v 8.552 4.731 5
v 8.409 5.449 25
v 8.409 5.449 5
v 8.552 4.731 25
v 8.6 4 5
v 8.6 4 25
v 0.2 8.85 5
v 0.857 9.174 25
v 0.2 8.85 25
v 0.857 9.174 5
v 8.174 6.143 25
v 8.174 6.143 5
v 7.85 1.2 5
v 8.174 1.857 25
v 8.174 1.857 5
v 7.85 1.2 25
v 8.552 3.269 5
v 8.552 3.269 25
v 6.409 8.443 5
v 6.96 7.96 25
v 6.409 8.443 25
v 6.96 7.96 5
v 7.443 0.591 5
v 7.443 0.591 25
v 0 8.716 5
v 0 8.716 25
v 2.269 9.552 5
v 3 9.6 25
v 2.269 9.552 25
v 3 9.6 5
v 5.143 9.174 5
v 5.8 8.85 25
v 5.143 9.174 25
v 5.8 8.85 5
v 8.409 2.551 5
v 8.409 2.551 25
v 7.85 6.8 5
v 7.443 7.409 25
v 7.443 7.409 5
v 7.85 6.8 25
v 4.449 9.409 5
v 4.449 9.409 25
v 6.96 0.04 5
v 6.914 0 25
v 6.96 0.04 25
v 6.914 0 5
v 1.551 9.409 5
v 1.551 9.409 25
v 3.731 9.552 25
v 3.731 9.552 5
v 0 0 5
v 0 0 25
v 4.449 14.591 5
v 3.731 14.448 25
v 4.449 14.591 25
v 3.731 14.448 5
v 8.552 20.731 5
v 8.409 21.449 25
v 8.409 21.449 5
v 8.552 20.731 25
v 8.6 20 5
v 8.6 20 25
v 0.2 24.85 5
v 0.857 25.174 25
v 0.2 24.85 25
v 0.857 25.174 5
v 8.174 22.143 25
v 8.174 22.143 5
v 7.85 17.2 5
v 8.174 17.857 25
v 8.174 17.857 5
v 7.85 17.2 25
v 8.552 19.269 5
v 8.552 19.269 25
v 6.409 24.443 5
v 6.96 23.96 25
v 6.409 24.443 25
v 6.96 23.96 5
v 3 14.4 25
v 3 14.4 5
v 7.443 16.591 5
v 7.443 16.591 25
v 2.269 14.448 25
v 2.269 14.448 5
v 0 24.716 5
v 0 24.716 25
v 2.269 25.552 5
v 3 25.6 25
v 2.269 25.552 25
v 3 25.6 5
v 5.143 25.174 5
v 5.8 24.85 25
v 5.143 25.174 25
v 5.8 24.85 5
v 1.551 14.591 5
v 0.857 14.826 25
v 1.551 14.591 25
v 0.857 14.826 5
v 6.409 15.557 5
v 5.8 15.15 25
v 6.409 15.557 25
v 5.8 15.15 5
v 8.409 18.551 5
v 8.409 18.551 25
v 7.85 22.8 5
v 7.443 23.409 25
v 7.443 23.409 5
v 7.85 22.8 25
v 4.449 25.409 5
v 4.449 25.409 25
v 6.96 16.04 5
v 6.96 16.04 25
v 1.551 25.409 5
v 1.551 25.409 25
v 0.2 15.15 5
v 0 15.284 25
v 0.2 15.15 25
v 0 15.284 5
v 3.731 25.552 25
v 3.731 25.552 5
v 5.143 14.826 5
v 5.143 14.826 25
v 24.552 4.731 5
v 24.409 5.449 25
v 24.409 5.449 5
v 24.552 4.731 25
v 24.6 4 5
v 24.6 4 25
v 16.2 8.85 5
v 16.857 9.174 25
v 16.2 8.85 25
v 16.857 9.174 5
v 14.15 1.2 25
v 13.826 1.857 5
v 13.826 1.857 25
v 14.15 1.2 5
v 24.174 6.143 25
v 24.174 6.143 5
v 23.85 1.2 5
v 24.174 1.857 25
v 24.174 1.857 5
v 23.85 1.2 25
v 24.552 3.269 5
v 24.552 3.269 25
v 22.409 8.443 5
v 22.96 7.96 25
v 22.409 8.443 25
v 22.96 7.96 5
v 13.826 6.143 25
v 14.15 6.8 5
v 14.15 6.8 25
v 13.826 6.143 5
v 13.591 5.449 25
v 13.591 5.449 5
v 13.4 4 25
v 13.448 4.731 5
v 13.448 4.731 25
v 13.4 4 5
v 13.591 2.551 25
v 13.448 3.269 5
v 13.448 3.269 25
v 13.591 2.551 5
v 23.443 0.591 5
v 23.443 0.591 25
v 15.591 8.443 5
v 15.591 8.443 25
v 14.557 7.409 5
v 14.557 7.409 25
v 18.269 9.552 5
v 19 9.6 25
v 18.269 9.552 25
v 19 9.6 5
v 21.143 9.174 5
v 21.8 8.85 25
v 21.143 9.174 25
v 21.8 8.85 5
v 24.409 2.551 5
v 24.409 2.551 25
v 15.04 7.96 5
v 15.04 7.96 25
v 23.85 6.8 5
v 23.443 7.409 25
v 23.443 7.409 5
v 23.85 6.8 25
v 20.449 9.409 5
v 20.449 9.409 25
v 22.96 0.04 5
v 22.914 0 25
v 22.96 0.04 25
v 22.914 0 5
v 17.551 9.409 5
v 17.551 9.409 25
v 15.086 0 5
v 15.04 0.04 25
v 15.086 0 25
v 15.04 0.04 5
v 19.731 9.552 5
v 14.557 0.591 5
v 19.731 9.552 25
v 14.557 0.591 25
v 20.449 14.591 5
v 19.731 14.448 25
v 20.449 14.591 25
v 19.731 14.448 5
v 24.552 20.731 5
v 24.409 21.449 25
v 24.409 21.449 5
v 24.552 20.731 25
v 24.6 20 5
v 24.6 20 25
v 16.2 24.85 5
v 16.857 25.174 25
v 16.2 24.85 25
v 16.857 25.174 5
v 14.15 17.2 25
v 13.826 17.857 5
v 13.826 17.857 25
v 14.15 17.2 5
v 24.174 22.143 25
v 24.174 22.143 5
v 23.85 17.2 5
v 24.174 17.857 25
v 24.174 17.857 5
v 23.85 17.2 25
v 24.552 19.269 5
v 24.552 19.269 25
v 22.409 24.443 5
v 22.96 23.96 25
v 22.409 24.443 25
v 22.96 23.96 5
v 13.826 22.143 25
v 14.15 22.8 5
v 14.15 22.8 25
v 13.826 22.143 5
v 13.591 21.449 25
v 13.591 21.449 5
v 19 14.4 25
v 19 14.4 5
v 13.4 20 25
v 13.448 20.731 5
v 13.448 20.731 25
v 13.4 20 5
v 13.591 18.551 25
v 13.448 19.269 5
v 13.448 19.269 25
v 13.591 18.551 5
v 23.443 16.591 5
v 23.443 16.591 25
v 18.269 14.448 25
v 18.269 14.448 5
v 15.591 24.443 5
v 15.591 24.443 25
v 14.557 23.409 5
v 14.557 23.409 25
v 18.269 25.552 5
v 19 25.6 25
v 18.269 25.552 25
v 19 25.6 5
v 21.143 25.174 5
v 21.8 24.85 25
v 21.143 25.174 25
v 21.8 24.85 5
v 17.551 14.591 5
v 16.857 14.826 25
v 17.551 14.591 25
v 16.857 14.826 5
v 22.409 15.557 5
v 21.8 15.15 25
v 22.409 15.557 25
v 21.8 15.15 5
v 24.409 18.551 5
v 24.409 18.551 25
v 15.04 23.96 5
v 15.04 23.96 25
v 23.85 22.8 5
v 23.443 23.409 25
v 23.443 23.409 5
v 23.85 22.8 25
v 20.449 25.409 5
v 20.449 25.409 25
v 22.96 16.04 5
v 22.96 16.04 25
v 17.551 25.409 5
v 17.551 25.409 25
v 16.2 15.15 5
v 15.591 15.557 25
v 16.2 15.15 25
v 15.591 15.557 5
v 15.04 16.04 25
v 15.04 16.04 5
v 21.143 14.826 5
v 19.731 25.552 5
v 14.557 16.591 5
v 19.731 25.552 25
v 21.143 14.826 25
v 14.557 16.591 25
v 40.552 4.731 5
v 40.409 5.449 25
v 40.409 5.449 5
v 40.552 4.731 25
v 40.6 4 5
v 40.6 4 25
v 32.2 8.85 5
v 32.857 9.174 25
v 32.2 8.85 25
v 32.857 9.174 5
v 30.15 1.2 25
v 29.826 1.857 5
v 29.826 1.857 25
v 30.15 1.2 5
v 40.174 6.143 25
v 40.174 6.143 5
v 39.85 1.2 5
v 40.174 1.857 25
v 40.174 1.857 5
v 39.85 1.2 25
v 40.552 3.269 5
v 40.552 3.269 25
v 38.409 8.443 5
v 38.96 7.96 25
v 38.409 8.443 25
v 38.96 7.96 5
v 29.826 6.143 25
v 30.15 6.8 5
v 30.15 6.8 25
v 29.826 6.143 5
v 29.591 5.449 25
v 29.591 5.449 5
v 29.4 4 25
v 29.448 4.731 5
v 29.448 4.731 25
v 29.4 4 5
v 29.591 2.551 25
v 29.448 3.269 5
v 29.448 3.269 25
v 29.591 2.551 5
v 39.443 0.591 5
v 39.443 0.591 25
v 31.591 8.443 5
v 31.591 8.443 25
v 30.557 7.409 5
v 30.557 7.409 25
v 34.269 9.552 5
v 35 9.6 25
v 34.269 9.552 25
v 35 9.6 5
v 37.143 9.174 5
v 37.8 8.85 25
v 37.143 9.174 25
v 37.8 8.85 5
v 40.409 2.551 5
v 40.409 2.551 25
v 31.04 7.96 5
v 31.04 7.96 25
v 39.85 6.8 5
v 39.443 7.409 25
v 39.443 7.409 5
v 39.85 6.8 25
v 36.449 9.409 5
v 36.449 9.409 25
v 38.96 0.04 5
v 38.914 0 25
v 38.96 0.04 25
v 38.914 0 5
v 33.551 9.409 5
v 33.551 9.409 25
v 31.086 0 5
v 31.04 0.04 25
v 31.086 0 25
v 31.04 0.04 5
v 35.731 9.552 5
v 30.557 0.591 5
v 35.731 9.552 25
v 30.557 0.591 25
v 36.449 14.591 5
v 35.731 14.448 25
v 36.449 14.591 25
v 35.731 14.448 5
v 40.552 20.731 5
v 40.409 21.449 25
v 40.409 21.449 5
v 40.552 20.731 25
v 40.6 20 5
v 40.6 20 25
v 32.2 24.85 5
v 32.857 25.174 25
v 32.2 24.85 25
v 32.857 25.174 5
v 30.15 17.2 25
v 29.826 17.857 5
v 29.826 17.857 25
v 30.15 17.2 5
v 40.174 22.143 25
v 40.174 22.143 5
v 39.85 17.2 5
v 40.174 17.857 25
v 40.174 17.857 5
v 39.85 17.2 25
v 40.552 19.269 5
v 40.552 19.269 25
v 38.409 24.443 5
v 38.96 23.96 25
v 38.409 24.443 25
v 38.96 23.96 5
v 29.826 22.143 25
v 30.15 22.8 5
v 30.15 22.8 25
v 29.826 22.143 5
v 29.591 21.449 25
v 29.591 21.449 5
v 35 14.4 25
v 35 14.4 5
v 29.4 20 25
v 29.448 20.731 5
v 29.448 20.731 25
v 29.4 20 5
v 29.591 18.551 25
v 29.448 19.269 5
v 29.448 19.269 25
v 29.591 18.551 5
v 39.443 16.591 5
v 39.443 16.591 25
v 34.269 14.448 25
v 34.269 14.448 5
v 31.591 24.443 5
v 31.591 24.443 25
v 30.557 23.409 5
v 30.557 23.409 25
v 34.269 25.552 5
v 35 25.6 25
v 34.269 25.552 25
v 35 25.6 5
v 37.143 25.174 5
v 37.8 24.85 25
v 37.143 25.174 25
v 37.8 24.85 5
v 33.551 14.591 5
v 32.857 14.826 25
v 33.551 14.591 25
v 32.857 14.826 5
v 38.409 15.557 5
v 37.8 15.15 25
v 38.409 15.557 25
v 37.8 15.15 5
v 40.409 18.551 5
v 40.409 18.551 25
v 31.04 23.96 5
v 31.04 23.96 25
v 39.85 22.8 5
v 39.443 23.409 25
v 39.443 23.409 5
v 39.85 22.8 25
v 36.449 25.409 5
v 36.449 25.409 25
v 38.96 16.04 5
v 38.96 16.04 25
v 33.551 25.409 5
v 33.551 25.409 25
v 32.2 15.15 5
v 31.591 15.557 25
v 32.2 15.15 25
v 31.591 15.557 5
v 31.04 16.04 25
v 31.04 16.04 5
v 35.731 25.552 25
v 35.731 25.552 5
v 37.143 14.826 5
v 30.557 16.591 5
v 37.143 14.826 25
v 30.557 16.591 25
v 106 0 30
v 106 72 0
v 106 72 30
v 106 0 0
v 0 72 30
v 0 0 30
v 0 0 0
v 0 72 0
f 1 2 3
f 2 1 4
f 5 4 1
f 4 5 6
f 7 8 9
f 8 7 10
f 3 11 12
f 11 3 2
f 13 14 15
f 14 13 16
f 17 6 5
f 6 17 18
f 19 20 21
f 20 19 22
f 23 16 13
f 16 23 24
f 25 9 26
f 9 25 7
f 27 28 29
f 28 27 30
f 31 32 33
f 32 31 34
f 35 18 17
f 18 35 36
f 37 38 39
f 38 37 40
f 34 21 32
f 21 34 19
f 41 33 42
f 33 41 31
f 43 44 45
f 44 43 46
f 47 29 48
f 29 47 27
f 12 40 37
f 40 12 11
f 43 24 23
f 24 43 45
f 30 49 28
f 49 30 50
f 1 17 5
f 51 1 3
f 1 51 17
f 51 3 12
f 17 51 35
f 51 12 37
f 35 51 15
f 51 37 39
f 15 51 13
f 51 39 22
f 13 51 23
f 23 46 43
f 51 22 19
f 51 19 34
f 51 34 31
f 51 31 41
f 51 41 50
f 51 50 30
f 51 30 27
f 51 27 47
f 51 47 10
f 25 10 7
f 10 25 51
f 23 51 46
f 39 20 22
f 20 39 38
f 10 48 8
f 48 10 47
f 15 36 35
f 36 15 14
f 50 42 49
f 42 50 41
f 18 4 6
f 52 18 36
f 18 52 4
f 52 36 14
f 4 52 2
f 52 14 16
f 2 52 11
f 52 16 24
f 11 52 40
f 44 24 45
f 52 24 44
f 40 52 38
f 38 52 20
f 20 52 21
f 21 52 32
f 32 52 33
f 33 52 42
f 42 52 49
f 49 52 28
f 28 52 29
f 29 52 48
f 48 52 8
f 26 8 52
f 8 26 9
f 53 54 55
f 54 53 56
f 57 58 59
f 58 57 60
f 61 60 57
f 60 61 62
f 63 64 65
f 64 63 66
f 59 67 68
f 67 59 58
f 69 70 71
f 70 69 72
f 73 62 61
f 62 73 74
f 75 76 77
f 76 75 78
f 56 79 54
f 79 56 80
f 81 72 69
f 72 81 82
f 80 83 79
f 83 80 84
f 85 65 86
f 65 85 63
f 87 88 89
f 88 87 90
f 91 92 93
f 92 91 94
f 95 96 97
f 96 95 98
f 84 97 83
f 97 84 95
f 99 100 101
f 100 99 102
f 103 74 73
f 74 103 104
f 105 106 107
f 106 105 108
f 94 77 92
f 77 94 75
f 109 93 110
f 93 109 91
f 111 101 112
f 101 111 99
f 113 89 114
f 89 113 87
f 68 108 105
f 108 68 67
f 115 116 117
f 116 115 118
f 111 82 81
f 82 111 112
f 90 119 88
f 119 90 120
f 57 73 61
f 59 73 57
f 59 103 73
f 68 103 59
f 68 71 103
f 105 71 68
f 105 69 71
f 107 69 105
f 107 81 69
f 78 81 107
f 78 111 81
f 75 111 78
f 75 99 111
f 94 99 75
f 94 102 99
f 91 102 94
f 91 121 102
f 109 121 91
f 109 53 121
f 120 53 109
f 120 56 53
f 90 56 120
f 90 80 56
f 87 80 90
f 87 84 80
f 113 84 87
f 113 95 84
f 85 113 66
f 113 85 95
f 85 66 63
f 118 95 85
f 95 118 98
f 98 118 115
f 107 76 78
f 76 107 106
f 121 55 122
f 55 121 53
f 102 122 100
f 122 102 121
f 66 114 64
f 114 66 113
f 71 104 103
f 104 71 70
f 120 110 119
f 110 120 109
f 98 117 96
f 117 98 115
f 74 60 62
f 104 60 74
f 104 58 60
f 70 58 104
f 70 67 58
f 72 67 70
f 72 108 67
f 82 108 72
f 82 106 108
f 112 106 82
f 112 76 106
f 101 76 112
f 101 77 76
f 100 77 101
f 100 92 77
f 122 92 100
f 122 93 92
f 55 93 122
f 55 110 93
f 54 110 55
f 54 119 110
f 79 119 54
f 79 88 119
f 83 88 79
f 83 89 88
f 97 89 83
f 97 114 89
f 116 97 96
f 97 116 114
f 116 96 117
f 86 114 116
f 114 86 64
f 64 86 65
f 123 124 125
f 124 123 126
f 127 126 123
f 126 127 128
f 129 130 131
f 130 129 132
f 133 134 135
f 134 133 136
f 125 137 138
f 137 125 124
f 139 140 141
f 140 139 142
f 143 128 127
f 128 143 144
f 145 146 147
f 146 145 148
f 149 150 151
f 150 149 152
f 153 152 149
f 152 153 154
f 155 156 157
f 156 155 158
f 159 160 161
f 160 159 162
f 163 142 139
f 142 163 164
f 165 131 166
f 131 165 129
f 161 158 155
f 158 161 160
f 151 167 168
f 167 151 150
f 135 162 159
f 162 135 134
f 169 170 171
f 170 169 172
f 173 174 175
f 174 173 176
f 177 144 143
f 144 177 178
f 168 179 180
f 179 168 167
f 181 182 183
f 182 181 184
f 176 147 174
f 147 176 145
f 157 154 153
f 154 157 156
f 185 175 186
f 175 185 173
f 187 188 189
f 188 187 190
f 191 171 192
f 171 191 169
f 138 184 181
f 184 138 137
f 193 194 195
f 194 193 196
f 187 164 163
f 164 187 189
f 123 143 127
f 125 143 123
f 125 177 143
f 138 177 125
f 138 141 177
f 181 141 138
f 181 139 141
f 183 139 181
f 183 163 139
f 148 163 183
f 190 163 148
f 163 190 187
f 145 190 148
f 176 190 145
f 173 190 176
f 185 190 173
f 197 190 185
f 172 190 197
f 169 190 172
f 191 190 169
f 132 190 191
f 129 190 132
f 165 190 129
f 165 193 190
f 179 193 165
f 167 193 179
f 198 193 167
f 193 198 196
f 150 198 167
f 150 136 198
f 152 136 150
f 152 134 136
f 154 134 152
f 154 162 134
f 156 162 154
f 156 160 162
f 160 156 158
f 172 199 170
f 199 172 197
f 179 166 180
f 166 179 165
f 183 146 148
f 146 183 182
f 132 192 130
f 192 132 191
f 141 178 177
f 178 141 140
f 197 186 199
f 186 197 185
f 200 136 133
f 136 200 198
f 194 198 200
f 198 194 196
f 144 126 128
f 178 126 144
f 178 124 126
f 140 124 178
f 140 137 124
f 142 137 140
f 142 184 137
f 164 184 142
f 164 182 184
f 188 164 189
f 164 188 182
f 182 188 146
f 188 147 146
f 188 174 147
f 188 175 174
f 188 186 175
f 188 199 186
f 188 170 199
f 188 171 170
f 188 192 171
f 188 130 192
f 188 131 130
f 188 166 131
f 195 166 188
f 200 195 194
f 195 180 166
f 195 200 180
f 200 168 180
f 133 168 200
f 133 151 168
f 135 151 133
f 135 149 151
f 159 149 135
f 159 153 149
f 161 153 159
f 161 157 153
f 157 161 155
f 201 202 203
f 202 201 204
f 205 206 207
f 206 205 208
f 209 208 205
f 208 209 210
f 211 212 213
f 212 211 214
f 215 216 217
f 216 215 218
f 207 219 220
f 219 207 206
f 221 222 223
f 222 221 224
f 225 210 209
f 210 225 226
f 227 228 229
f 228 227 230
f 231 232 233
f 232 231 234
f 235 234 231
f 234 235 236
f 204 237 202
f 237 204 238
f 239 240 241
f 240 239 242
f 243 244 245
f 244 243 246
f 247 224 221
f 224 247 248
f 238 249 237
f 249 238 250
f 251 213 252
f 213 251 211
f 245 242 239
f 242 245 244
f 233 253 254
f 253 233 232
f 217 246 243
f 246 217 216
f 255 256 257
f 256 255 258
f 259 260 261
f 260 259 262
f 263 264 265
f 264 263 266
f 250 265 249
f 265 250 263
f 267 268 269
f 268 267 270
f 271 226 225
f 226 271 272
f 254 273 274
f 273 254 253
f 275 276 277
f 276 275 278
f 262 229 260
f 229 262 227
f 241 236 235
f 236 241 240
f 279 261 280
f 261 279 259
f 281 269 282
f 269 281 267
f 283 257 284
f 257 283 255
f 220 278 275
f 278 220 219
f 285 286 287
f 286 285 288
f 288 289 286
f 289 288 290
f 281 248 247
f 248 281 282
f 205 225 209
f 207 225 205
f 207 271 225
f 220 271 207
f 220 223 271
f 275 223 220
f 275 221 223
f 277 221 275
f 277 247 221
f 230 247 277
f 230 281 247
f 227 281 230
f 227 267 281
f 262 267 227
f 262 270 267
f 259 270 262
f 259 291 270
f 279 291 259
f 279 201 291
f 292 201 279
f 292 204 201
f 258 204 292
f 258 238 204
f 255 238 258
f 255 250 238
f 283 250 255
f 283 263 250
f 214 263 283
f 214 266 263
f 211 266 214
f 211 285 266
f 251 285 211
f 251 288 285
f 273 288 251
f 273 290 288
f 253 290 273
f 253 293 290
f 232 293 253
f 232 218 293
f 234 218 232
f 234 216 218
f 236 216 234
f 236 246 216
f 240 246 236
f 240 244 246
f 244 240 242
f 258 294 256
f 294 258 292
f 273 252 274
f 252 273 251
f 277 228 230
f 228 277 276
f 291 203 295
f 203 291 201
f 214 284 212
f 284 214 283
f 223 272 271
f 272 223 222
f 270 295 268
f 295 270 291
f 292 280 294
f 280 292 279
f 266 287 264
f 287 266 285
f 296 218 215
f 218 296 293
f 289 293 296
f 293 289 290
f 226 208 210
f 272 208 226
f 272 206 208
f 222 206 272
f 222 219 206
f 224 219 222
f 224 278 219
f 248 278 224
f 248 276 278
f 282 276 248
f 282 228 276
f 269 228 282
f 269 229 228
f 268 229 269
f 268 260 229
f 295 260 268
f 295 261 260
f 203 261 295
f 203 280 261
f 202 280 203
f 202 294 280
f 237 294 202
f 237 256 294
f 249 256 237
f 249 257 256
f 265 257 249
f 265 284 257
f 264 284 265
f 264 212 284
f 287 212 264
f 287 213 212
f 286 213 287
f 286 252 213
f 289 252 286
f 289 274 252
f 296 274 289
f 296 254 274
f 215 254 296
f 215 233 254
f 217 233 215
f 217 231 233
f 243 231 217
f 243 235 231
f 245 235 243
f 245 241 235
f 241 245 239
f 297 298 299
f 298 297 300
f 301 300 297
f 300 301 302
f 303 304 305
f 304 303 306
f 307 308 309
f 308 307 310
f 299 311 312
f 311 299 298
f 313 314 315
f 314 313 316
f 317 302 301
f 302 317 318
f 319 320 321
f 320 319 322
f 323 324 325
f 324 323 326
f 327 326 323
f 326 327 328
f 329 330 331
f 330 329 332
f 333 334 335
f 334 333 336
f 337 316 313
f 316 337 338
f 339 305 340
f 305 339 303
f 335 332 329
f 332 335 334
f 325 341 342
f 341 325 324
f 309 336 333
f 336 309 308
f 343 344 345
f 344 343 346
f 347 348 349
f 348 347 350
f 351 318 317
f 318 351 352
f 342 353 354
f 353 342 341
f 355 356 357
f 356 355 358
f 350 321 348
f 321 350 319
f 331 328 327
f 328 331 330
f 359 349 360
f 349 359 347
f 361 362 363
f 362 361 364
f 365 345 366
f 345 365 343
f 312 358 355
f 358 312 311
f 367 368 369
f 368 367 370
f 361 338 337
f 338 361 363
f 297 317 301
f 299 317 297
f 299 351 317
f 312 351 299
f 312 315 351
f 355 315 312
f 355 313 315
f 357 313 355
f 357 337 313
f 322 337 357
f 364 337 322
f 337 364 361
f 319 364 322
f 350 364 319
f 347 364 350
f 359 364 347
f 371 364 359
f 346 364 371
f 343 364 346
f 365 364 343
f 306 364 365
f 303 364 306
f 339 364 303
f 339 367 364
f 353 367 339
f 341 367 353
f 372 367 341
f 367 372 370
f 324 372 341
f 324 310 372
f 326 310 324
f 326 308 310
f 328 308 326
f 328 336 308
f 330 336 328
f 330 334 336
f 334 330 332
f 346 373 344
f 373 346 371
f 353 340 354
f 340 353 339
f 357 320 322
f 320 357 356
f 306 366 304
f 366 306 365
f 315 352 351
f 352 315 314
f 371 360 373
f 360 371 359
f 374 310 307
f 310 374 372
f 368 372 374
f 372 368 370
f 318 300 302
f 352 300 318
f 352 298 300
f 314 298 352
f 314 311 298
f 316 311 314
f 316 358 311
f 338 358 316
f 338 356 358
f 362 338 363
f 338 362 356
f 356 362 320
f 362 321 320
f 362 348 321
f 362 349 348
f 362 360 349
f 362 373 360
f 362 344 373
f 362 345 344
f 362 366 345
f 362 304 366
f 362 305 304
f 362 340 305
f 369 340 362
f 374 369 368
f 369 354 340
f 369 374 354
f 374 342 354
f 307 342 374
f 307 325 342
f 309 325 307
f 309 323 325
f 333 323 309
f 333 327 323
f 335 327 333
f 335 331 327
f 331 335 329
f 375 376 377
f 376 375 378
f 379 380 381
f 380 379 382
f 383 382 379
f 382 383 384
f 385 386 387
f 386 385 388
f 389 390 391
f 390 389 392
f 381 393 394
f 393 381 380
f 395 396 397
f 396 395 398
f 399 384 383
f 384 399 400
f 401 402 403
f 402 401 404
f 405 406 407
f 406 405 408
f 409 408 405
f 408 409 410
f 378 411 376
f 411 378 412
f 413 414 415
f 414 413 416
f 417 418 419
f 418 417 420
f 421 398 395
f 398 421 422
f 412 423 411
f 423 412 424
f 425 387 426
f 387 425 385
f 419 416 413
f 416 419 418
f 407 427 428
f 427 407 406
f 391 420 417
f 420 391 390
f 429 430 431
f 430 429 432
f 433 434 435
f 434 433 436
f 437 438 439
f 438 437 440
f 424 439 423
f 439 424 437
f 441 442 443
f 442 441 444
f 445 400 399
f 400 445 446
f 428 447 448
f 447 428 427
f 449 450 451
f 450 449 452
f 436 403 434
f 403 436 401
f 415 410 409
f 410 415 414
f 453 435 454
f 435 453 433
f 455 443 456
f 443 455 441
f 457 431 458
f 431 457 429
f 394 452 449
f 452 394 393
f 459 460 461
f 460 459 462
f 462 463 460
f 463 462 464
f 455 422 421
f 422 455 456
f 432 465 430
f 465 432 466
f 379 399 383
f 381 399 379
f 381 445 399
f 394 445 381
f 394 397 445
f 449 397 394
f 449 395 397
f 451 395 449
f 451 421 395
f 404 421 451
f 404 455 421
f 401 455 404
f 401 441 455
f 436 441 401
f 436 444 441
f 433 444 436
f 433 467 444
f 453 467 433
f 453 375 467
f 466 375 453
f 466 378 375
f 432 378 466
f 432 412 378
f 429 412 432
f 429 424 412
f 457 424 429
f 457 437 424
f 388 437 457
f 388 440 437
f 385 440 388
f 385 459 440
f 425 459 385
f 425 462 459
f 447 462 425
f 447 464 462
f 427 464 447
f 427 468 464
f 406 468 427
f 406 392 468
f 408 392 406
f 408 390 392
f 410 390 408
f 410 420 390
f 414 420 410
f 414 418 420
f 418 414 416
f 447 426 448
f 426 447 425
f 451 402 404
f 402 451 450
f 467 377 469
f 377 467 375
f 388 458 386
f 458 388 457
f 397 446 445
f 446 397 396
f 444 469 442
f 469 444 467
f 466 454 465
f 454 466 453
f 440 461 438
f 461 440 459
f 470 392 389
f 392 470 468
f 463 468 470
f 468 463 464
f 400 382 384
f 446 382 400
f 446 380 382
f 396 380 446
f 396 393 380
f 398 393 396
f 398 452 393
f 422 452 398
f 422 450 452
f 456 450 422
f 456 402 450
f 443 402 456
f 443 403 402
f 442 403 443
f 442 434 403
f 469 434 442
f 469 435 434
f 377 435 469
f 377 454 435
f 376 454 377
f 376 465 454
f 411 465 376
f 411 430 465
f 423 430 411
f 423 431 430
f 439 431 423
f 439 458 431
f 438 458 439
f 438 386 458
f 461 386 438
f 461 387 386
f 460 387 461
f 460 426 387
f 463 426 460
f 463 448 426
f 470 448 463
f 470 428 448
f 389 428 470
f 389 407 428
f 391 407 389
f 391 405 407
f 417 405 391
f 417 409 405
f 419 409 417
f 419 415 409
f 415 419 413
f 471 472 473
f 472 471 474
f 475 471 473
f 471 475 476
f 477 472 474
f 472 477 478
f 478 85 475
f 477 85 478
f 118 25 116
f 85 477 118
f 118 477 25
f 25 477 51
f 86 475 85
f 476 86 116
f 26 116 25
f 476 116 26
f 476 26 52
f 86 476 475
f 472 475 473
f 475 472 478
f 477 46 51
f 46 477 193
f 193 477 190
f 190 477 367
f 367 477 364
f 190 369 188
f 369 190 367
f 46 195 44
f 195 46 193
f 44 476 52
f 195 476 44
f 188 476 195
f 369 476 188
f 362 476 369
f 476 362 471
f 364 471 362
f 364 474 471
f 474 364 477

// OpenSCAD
// Bench rack for 1.5 mL microcentrifuge tubes - a solid rectangular block with a regular
// grid of vertical tube holes, open at the top and closed at the bottom (a "floor" below
// the lowest hole). NOVEL general part, parametric in its dimensions.
//

L   = 106;
W   = 72;
H   = 30;
rows = 4;
cols = 6;
pX   = 16;
pY   = 16;
d    = 11.2;
depth = 25;

$fn = 48;

floor_t = 5;
hole_depth = depth - floor_t;

difference() {
    cube([L, W, H]);
    for (i = [0 : cols - 1], j = [0 : rows - 1])
        translate([
            -L / 2 + pX / 2 + i * pX,
            -W / 2 + pY / 2 + j * pY,
            floor_t
        ]) cylinder(h = hole_depth, d = d);
}
